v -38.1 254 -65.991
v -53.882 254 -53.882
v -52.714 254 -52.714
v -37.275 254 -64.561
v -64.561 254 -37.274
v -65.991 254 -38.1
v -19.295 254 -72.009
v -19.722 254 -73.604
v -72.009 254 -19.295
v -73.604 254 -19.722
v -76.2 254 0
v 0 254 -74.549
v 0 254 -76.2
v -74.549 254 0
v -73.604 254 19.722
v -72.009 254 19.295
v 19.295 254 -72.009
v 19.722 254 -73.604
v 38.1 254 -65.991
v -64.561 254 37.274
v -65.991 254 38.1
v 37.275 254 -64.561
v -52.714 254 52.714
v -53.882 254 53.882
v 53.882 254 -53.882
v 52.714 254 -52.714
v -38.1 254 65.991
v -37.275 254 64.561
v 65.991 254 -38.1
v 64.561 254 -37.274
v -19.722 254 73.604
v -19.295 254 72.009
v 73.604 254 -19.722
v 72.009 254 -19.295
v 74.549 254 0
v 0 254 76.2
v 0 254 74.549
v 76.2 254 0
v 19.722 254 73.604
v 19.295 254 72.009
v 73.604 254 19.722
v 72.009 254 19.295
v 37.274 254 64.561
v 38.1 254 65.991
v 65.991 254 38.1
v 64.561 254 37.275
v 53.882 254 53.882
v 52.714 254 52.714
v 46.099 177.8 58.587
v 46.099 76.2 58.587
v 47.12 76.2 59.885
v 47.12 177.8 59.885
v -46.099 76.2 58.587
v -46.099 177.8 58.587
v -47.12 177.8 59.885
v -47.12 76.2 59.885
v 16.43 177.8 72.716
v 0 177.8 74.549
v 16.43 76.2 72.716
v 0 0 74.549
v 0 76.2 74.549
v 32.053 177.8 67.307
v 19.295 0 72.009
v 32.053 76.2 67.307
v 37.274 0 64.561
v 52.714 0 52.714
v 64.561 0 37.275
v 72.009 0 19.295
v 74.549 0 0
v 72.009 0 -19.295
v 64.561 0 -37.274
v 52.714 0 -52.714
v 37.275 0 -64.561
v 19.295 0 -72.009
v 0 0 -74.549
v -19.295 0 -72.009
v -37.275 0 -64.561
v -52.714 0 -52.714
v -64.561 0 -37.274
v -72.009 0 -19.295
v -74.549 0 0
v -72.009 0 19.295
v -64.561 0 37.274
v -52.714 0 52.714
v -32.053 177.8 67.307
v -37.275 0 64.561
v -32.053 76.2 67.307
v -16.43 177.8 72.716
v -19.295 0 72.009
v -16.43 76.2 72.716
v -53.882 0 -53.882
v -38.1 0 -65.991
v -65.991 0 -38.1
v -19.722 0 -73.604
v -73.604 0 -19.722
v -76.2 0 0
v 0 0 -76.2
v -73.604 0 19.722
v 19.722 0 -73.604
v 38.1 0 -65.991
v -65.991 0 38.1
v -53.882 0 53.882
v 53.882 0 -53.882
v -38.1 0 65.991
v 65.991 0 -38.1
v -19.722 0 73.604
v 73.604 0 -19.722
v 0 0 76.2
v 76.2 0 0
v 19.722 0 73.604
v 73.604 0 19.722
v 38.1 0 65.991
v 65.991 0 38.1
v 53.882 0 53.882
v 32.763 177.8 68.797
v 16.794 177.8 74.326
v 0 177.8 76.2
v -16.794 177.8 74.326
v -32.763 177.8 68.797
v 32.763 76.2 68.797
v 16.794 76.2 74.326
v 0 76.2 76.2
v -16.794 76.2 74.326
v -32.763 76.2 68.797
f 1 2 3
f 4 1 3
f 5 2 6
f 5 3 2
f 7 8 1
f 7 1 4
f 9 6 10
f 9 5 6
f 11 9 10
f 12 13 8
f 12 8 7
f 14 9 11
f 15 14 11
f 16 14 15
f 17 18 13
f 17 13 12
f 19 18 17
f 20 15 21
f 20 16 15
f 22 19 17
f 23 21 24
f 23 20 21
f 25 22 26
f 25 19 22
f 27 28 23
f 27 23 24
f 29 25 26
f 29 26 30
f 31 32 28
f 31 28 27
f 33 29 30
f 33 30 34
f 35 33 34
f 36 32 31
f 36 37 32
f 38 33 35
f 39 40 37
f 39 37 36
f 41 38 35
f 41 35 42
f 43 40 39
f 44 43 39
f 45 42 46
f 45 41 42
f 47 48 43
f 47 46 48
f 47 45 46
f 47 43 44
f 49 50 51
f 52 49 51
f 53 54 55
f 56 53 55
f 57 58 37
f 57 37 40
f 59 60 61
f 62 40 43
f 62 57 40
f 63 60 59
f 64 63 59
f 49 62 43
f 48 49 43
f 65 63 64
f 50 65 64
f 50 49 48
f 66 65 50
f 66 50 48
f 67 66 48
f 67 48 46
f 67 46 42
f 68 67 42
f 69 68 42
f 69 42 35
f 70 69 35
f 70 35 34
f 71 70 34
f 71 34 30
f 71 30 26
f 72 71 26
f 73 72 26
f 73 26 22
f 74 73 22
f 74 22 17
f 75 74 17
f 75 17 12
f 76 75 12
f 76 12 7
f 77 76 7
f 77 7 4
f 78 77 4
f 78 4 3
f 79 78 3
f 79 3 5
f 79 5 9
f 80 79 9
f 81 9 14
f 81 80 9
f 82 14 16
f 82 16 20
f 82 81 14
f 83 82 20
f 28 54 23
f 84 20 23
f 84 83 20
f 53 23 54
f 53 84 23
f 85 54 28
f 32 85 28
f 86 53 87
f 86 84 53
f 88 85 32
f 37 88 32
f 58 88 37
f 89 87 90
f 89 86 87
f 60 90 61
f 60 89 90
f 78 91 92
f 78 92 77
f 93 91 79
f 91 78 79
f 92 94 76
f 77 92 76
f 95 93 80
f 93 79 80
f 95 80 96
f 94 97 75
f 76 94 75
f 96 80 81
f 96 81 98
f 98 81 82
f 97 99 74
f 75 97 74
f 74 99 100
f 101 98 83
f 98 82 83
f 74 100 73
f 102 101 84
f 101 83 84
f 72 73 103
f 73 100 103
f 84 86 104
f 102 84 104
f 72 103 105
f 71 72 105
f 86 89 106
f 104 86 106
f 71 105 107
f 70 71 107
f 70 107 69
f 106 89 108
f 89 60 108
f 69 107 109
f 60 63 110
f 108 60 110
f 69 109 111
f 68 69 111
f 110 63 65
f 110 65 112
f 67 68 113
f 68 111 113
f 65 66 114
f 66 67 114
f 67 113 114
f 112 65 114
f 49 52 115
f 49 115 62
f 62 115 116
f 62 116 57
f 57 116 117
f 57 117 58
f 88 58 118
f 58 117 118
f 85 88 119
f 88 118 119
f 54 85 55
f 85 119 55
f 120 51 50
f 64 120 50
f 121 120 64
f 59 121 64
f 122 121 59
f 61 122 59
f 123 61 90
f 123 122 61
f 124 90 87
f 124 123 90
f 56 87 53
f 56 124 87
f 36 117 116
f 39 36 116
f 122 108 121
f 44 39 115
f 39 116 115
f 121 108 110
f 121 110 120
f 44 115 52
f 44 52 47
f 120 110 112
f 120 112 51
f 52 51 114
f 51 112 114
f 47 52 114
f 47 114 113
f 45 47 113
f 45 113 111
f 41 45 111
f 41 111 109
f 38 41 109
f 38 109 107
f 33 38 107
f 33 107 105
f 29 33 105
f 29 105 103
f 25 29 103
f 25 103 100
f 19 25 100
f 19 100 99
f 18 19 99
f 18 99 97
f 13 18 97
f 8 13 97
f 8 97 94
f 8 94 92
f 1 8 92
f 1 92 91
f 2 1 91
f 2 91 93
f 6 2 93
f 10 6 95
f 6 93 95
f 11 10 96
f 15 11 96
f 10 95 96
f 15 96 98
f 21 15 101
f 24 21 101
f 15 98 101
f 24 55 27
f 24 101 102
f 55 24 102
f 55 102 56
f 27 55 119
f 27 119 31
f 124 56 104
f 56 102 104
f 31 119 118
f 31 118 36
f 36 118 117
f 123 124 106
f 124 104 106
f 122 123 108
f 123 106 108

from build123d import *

# Parameters (mm, degrees)
SKETCH1_R           = 76.2
SKETCH1_R_2         = 74.549
BOSS_EXTRUDE1_DEPTH = 254
WRAP2_SECTION_W     = 3.302
WRAP2_SECTION_H     = 101.6
WRAP2_ANGLE         = 76.394372684


with BuildPart() as part:
    # Sketch1 → Boss-Extrude1 (new body)
    with BuildSketch(Plane(origin=(0, 0, 0), x_dir=(1, 0, 0), z_dir=(0, 1, 0))):
        with Locations(Location((0, 0, 0), (0, 0, 270))):
            Circle(SKETCH1_R)
        with Locations(Location((0, 0, 0), (0, 0, 270))):
            Circle(SKETCH1_R_2, mode=Mode.SUBTRACT)
    extrude(amount=BOSS_EXTRUDE1_DEPTH)

    # Wrap2 section (on wrap section) → Wrap2 (revolve, cut)
    with BuildSketch(Plane(origin=(0, 0, 0), x_dir=(0.6183698030697371, 0, 0.7858872607769479), z_dir=(0.7858872607769479, 0, -0.6183698030697371))):
        with Locations((74.549, -127)):
            Rectangle(WRAP2_SECTION_W, WRAP2_SECTION_H)
    revolve(axis=Axis((0, 0, 0), (0, -1, 0)), revolution_arc=WRAP2_ANGLE, mode=Mode.SUBTRACT)


solid = part.part
